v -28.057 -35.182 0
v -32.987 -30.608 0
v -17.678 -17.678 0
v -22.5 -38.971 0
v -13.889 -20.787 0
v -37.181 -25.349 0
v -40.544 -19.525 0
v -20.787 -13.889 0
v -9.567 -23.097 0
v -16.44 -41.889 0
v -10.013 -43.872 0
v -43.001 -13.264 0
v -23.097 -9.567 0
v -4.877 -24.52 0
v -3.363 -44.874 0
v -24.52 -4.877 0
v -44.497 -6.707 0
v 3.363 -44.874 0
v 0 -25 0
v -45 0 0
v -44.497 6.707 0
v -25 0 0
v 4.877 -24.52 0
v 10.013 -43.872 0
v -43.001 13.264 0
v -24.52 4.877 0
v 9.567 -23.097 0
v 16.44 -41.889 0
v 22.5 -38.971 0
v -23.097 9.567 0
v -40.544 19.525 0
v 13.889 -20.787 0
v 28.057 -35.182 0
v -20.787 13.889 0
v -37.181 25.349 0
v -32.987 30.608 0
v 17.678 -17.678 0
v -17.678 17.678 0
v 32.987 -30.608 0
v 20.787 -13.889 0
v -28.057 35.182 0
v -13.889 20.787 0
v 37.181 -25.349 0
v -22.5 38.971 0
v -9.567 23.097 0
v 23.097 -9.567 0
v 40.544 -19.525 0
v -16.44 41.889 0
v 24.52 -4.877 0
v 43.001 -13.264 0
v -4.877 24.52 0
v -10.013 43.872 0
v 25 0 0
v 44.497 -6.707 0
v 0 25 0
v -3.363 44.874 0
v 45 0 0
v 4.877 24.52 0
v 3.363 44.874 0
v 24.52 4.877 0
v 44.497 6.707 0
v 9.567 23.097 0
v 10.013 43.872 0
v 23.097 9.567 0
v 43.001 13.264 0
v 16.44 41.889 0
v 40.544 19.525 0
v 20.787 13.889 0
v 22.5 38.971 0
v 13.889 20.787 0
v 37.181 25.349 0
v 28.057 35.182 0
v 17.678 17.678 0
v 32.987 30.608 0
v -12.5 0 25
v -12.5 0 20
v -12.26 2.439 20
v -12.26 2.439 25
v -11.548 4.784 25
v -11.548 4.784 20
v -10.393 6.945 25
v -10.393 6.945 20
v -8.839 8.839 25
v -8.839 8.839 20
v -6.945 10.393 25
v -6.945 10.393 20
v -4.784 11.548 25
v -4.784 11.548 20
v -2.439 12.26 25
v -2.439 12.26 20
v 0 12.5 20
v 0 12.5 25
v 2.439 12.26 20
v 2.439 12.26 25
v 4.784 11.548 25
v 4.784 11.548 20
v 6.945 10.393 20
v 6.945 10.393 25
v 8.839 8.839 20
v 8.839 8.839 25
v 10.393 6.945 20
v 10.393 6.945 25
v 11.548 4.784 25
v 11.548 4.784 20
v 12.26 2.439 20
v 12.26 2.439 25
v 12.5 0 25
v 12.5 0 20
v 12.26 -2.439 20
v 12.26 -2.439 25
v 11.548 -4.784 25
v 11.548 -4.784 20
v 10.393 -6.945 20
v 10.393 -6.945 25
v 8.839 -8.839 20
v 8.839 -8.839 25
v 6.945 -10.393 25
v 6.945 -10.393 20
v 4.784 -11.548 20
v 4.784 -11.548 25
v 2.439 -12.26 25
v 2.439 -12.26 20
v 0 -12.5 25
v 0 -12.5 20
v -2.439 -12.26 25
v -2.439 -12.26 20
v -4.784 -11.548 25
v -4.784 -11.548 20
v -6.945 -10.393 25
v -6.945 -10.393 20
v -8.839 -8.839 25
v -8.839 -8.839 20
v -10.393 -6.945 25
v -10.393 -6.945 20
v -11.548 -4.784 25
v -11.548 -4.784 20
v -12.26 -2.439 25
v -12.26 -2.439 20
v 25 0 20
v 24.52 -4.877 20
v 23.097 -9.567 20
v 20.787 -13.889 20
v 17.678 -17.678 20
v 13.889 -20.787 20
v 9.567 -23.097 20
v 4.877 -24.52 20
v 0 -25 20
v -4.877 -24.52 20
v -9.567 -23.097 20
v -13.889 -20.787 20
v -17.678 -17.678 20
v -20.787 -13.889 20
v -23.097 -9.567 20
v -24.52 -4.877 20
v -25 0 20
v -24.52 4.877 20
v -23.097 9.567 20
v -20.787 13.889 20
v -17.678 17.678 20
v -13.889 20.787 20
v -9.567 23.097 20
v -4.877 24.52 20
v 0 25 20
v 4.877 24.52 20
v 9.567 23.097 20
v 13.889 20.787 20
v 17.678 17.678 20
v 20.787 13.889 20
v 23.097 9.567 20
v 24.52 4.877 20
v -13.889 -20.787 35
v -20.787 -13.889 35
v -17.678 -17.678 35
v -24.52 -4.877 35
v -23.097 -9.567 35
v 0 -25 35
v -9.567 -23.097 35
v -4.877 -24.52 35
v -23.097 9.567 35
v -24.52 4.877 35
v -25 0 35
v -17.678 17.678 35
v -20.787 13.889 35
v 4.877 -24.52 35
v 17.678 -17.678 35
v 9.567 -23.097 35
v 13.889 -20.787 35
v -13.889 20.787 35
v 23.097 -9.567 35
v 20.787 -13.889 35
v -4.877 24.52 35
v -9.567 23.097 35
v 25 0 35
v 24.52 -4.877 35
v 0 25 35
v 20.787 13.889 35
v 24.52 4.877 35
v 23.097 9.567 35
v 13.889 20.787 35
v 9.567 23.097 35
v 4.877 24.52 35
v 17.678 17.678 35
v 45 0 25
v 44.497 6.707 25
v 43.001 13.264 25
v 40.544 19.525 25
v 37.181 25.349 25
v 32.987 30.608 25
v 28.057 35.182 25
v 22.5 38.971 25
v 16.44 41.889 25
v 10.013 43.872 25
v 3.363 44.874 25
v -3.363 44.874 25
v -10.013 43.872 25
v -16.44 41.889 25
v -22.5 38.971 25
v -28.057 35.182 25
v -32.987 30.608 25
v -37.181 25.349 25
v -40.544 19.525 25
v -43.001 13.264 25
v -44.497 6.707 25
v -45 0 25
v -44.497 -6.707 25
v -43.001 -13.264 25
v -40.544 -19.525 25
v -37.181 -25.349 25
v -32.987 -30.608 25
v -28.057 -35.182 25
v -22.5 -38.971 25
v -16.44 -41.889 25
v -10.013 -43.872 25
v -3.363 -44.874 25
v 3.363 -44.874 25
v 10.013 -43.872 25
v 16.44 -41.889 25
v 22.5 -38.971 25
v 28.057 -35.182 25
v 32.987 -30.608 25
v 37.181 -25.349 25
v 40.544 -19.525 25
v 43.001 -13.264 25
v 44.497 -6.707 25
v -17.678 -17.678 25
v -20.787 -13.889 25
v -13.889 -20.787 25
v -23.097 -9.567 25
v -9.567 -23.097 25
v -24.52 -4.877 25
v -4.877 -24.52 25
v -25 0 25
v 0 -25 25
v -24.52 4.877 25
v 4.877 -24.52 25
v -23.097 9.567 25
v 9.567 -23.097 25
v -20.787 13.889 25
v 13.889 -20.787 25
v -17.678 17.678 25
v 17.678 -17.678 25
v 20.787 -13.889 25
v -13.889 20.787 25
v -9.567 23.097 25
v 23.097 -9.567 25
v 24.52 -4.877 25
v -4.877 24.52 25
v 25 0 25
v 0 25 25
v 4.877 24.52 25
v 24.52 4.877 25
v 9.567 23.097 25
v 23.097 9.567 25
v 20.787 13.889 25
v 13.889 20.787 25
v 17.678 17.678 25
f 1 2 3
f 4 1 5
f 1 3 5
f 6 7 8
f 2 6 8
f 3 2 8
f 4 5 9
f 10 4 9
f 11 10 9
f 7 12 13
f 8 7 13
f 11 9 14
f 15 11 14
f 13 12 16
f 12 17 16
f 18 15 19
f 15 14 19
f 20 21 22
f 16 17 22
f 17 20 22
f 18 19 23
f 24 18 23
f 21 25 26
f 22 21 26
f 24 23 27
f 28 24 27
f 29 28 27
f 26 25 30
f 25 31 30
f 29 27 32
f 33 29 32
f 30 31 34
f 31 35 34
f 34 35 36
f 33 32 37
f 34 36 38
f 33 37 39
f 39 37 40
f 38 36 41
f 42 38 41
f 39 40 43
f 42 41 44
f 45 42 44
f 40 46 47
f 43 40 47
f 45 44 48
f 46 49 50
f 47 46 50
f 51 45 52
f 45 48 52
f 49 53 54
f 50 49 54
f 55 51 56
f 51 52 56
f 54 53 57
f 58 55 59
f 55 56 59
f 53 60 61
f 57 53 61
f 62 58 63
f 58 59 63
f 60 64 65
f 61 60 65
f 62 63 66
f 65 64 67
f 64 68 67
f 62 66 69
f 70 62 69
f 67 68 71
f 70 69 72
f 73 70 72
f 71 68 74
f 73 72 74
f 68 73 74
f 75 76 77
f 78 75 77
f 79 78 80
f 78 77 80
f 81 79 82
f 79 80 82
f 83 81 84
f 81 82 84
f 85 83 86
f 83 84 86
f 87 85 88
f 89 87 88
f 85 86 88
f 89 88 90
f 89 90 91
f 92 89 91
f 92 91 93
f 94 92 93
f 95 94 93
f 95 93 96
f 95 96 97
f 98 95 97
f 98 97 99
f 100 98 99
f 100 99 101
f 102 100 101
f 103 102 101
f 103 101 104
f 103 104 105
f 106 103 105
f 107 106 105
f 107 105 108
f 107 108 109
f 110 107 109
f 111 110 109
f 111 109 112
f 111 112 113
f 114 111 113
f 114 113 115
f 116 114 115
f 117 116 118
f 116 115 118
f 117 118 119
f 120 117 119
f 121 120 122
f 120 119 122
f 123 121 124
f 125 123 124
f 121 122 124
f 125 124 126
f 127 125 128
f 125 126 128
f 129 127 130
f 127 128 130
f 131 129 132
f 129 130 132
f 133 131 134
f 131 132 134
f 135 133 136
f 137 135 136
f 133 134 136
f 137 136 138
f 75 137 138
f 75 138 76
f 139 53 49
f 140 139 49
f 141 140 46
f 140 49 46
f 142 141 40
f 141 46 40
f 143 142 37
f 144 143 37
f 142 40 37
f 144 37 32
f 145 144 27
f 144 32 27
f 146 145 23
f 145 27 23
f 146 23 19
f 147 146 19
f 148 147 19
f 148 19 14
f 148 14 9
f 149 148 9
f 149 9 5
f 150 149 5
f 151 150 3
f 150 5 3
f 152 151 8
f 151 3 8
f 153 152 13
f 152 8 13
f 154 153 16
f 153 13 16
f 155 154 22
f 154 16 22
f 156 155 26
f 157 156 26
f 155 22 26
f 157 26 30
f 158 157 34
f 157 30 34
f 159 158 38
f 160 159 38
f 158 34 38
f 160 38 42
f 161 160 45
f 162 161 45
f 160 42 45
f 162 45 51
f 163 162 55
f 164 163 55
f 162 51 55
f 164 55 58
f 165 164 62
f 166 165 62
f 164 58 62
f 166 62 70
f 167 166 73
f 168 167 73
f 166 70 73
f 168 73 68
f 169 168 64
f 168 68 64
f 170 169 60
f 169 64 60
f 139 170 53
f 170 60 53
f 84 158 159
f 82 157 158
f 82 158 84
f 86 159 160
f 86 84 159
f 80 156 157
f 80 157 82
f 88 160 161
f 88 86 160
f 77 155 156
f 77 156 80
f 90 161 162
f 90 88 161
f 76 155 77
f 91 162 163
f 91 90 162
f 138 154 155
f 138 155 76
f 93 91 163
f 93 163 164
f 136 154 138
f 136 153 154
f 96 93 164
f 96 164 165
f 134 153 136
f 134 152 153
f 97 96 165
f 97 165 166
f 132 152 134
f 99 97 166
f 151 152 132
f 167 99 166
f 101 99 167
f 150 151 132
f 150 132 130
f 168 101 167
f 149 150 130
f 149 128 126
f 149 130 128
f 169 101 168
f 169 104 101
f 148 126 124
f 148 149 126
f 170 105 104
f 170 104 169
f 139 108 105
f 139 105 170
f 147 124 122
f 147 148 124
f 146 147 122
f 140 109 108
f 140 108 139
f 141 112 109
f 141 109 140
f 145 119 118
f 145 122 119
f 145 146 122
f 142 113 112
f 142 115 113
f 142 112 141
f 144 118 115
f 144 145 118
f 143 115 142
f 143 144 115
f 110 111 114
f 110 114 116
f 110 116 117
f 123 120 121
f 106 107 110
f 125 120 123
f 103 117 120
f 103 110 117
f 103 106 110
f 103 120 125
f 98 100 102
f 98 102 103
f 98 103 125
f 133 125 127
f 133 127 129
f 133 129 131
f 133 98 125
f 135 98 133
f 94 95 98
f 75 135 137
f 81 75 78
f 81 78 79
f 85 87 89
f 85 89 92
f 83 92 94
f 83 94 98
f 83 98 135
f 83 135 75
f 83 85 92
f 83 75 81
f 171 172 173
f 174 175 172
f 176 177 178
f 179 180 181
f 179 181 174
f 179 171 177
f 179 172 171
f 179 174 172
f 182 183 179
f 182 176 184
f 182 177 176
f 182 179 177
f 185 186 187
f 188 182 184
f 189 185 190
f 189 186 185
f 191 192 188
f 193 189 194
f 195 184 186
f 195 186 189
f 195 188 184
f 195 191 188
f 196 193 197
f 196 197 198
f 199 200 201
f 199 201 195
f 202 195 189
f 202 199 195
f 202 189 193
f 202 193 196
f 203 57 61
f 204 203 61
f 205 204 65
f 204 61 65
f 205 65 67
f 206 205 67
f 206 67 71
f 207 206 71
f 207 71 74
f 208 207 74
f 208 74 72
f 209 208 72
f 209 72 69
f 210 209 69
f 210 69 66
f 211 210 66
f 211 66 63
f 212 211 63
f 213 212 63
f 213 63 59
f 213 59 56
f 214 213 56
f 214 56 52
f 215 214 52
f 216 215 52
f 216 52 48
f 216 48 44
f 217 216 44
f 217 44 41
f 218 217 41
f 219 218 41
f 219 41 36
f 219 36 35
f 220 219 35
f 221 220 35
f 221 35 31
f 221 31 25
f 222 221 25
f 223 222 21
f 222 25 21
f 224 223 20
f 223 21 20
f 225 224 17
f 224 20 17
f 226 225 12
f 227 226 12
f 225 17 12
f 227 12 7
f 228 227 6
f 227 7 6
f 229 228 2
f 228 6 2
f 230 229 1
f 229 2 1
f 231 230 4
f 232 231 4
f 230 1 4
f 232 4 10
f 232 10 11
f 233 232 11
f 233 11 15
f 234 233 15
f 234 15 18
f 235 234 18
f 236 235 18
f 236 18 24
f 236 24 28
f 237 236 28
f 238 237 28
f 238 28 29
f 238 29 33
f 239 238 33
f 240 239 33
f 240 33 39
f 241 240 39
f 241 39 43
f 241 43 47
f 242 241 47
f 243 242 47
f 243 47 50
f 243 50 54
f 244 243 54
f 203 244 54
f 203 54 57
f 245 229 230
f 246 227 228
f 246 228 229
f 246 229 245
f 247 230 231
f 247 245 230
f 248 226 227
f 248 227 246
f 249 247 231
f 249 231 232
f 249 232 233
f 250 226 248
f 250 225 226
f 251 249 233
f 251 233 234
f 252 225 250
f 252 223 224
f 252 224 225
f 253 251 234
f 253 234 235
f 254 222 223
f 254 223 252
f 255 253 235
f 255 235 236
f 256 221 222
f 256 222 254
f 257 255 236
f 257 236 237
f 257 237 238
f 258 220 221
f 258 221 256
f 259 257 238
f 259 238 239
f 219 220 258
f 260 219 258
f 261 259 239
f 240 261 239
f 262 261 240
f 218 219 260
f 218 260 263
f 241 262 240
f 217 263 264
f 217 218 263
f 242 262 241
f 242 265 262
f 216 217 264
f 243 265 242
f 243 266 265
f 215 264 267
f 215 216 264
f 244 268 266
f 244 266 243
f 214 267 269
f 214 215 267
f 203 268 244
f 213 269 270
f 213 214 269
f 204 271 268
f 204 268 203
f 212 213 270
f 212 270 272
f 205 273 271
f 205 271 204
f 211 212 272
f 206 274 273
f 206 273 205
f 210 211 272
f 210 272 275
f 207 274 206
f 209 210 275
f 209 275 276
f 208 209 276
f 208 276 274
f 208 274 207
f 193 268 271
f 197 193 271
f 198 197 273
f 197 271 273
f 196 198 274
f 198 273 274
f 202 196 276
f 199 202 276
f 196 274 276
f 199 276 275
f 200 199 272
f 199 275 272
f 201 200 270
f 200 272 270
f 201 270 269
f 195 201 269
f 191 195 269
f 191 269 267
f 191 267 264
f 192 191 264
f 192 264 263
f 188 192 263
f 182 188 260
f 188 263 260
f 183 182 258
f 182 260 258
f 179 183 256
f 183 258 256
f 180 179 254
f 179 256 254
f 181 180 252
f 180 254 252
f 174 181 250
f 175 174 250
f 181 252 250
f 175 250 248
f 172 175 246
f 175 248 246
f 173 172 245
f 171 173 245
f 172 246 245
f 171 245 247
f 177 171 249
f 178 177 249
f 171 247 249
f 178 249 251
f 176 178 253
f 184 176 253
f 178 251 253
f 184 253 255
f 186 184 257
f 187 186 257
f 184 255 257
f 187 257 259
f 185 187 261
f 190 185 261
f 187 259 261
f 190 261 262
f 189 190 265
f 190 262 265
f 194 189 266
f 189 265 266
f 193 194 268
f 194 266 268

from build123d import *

# Parameters (mm, degrees)
SKETCH_1_R          = 45
EXTRUDE_1_DEPTH     = 35
SKETCH_4_R          = 12.5
CUT_EXTRUDE_3_DEPTH = 25
CUT_EXTRUDE_START   = -10
SKETCH_5_R          = 45
SKETCH_5_R_2        = 25
CUT_EXTRUDE_4_DEPTH = 10
SKETCH_6_R          = 25
CUT_EXTRUDE_6_DEPTH = 20


with BuildPart() as part:
    # Эскиз1 → Вытянуть1 (new body)
    with BuildSketch(Plane.XY):
        Circle(SKETCH_1_R)
    extrude(amount=EXTRUDE_1_DEPTH)

    # Эскиз4 → Вытянуть3 (cut)
    with BuildSketch(Plane(origin=(0, 0, 0), x_dir=(-1, 0, 0), z_dir=(0, 0, -1))):
        Circle(SKETCH_4_R)
    extrude(amount=-CUT_EXTRUDE_3_DEPTH, mode=Mode.SUBTRACT)

    # Эскиз5 → Вытянуть4 (cut)
    with BuildSketch(Plane.XY.offset(35).offset(CUT_EXTRUDE_START)):
        Circle(SKETCH_5_R)
        Circle(SKETCH_5_R_2, mode=Mode.SUBTRACT)
    extrude(amount=CUT_EXTRUDE_4_DEPTH, mode=Mode.SUBTRACT)

    # Эскиз6 → Вытянуть6 (cut)
    with BuildSketch(Plane(origin=(0, 0, 0), x_dir=(-1, 0, 0), z_dir=(0, 0, -1))):
        with Locations(Location((0, 0, 0), (0, 0, 180))):
            Circle(SKETCH_6_R)
    extrude(amount=-CUT_EXTRUDE_6_DEPTH, mode=Mode.SUBTRACT)


solid = part.part
